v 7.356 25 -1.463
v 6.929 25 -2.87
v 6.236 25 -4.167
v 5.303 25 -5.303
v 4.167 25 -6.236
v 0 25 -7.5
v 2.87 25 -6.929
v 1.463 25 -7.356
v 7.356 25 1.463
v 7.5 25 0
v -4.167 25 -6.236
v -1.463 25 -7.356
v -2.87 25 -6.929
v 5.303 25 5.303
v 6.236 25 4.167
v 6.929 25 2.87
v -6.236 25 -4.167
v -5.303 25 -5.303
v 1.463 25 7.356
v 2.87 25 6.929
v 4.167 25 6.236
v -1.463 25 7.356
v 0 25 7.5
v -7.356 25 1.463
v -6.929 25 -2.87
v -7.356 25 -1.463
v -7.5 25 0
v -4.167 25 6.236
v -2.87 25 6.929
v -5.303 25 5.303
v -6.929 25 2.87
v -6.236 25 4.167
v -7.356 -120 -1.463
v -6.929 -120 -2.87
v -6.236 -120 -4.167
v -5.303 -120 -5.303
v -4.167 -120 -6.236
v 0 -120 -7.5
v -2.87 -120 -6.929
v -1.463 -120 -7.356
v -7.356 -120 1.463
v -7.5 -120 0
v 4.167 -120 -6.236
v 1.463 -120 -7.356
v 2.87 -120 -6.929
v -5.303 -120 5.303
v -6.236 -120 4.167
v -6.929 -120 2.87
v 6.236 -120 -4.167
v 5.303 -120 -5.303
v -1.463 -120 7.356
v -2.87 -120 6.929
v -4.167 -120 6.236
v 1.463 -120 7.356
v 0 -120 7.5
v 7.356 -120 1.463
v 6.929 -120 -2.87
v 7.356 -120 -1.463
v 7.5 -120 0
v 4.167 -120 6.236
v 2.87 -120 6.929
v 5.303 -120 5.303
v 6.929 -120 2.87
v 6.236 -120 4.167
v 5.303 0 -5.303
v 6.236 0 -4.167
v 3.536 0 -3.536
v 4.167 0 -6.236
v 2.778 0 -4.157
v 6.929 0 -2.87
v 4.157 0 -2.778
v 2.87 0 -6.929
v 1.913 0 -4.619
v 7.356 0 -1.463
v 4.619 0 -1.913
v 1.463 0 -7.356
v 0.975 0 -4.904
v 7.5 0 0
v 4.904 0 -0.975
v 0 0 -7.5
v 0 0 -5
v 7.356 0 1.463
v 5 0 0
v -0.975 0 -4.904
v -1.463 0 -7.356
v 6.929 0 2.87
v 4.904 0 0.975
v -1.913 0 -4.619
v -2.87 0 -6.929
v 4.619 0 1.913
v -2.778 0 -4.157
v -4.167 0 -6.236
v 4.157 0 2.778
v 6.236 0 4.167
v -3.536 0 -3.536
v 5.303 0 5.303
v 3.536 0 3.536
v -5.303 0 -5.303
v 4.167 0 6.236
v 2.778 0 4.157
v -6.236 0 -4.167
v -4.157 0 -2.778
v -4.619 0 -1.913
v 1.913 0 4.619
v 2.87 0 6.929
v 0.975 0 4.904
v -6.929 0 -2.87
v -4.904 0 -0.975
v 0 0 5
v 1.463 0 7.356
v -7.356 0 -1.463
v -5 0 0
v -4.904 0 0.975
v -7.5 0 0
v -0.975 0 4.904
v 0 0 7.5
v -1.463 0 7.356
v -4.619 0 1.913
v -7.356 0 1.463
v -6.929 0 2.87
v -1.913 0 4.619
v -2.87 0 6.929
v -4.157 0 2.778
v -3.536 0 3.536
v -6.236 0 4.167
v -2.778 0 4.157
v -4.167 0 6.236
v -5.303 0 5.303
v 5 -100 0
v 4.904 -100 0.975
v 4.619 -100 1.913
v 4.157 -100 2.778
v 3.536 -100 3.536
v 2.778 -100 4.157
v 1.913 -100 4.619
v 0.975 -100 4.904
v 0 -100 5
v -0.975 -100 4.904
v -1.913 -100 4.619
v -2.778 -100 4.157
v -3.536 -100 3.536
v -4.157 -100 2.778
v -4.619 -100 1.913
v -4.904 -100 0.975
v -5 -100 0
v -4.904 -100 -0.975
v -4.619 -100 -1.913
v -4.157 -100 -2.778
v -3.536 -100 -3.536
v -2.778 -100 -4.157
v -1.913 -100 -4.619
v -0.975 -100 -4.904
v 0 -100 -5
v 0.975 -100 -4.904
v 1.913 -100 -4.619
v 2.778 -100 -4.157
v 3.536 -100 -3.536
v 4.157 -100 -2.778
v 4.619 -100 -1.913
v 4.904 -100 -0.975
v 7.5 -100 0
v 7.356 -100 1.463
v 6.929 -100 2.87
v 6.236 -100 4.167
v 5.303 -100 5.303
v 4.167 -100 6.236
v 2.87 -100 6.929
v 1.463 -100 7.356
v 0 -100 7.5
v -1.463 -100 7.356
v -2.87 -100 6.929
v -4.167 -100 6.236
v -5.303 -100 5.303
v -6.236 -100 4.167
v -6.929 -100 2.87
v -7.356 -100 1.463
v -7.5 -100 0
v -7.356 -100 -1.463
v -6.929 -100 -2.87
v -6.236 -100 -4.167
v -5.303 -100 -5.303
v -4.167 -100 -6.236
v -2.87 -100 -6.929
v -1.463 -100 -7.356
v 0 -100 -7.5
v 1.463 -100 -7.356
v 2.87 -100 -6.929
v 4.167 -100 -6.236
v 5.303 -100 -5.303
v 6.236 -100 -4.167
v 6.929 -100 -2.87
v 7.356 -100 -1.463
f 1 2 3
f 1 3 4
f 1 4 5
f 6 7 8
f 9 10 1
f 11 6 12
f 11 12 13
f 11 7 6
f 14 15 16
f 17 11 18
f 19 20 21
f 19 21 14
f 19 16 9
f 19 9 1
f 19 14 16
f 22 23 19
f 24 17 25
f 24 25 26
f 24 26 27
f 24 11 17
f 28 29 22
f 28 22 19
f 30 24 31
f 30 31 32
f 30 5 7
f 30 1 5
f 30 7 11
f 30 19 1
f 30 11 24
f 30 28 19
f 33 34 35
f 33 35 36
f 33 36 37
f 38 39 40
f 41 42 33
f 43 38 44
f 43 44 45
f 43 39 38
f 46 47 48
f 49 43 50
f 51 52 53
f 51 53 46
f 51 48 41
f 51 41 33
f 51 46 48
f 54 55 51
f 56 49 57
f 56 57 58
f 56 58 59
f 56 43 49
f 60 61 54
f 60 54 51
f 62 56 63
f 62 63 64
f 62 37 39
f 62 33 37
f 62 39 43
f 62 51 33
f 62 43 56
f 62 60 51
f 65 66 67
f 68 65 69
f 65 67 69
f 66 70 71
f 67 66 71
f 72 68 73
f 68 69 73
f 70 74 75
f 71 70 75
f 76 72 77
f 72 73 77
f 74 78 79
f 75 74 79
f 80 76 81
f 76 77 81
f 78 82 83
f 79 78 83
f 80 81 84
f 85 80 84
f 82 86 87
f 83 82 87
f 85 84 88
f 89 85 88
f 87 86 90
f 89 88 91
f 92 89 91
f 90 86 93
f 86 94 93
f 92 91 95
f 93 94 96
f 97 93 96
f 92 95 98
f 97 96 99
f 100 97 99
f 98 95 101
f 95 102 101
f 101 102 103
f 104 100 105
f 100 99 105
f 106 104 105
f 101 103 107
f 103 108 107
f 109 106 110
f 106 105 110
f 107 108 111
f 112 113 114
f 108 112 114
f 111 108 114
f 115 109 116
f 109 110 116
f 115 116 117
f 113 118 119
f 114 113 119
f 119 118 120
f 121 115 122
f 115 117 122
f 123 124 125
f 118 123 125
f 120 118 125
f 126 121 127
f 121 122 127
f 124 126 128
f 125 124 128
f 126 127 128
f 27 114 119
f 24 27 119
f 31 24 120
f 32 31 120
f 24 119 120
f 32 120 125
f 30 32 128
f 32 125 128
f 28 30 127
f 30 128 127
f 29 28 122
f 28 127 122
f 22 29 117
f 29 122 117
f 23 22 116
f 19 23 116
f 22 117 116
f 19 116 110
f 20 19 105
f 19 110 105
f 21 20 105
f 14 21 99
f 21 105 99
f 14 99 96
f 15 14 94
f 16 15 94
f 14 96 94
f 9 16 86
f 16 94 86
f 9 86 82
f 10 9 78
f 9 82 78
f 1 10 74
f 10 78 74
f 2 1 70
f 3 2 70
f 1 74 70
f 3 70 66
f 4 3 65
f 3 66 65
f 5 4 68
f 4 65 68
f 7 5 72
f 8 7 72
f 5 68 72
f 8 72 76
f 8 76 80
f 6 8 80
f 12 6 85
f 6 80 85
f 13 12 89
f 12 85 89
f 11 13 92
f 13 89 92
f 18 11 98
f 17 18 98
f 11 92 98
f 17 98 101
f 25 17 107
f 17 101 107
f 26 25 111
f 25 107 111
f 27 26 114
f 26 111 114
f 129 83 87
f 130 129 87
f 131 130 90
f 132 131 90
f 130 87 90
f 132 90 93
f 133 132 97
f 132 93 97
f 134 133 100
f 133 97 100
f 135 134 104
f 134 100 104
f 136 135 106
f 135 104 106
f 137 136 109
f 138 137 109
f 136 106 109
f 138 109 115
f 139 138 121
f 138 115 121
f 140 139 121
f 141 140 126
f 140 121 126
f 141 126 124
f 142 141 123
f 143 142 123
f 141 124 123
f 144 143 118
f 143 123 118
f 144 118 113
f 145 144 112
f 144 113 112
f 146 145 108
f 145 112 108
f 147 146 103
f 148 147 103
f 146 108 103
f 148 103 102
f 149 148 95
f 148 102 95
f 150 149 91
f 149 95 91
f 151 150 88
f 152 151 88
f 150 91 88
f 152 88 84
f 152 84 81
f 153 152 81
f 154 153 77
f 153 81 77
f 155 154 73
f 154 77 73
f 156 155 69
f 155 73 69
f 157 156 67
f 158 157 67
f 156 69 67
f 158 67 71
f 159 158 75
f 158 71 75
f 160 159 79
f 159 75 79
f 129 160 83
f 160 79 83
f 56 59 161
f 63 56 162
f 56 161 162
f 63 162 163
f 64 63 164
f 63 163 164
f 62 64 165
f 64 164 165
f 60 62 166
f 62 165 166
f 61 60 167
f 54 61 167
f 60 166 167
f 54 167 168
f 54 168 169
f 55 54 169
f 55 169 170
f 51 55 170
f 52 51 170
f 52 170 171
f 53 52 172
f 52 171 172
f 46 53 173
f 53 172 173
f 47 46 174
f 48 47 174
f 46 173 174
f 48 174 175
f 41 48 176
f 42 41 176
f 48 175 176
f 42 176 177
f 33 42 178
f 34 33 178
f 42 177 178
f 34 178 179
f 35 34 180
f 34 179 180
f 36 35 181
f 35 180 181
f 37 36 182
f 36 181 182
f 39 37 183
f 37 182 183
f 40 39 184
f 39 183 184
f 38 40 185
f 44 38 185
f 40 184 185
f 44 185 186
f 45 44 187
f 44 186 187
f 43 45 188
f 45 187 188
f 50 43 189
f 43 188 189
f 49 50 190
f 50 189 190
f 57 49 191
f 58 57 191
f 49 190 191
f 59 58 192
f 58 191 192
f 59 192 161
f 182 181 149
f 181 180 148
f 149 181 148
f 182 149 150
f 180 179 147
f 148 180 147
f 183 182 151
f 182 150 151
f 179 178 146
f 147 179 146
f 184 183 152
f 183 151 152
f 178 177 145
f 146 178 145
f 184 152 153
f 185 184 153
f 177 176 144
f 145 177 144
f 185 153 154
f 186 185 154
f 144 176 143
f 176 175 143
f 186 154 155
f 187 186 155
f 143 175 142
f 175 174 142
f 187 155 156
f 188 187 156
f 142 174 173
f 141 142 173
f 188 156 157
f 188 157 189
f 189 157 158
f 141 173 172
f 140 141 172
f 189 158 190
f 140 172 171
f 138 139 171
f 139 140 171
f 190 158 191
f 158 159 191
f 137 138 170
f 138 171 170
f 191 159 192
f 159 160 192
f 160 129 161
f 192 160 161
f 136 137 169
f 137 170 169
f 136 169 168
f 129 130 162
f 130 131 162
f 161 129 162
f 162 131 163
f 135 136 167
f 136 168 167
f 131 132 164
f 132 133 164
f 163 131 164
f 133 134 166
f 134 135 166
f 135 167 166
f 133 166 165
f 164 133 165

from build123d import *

# Parameters (mm, degrees)
F0_R     = 5
F1_DEPTH = 100
F2_R     = 7.5
F2_R_2   = 5
F3_DEPTH = 20
F4_R     = 7.5
F4_R_2   = 5
F5_DEPTH = 25


with BuildPart() as f1:
    # F0 (on Front) → F1 (new body)
    with BuildSketch(Plane.XZ):
        Circle(F0_R)
    extrude(amount=F1_DEPTH)

    # F2 (on face) → F3 (join)
    with BuildSketch(Plane.XZ.offset(100)):
        Circle(F2_R)
        Circle(F2_R_2, mode=Mode.SUBTRACT)
        Circle(F2_R_2)
    extrude(amount=F3_DEPTH)

    # F4 (on face) → F5 (join)
    with BuildSketch(Plane(origin=(0, 0, 0), x_dir=(-1, 0, 0), z_dir=(0, 1, 0))):
        Circle(F4_R)
        Circle(F4_R_2, mode=Mode.SUBTRACT)
        Circle(F4_R_2)
    extrude(amount=F5_DEPTH)


solid = f1.part
